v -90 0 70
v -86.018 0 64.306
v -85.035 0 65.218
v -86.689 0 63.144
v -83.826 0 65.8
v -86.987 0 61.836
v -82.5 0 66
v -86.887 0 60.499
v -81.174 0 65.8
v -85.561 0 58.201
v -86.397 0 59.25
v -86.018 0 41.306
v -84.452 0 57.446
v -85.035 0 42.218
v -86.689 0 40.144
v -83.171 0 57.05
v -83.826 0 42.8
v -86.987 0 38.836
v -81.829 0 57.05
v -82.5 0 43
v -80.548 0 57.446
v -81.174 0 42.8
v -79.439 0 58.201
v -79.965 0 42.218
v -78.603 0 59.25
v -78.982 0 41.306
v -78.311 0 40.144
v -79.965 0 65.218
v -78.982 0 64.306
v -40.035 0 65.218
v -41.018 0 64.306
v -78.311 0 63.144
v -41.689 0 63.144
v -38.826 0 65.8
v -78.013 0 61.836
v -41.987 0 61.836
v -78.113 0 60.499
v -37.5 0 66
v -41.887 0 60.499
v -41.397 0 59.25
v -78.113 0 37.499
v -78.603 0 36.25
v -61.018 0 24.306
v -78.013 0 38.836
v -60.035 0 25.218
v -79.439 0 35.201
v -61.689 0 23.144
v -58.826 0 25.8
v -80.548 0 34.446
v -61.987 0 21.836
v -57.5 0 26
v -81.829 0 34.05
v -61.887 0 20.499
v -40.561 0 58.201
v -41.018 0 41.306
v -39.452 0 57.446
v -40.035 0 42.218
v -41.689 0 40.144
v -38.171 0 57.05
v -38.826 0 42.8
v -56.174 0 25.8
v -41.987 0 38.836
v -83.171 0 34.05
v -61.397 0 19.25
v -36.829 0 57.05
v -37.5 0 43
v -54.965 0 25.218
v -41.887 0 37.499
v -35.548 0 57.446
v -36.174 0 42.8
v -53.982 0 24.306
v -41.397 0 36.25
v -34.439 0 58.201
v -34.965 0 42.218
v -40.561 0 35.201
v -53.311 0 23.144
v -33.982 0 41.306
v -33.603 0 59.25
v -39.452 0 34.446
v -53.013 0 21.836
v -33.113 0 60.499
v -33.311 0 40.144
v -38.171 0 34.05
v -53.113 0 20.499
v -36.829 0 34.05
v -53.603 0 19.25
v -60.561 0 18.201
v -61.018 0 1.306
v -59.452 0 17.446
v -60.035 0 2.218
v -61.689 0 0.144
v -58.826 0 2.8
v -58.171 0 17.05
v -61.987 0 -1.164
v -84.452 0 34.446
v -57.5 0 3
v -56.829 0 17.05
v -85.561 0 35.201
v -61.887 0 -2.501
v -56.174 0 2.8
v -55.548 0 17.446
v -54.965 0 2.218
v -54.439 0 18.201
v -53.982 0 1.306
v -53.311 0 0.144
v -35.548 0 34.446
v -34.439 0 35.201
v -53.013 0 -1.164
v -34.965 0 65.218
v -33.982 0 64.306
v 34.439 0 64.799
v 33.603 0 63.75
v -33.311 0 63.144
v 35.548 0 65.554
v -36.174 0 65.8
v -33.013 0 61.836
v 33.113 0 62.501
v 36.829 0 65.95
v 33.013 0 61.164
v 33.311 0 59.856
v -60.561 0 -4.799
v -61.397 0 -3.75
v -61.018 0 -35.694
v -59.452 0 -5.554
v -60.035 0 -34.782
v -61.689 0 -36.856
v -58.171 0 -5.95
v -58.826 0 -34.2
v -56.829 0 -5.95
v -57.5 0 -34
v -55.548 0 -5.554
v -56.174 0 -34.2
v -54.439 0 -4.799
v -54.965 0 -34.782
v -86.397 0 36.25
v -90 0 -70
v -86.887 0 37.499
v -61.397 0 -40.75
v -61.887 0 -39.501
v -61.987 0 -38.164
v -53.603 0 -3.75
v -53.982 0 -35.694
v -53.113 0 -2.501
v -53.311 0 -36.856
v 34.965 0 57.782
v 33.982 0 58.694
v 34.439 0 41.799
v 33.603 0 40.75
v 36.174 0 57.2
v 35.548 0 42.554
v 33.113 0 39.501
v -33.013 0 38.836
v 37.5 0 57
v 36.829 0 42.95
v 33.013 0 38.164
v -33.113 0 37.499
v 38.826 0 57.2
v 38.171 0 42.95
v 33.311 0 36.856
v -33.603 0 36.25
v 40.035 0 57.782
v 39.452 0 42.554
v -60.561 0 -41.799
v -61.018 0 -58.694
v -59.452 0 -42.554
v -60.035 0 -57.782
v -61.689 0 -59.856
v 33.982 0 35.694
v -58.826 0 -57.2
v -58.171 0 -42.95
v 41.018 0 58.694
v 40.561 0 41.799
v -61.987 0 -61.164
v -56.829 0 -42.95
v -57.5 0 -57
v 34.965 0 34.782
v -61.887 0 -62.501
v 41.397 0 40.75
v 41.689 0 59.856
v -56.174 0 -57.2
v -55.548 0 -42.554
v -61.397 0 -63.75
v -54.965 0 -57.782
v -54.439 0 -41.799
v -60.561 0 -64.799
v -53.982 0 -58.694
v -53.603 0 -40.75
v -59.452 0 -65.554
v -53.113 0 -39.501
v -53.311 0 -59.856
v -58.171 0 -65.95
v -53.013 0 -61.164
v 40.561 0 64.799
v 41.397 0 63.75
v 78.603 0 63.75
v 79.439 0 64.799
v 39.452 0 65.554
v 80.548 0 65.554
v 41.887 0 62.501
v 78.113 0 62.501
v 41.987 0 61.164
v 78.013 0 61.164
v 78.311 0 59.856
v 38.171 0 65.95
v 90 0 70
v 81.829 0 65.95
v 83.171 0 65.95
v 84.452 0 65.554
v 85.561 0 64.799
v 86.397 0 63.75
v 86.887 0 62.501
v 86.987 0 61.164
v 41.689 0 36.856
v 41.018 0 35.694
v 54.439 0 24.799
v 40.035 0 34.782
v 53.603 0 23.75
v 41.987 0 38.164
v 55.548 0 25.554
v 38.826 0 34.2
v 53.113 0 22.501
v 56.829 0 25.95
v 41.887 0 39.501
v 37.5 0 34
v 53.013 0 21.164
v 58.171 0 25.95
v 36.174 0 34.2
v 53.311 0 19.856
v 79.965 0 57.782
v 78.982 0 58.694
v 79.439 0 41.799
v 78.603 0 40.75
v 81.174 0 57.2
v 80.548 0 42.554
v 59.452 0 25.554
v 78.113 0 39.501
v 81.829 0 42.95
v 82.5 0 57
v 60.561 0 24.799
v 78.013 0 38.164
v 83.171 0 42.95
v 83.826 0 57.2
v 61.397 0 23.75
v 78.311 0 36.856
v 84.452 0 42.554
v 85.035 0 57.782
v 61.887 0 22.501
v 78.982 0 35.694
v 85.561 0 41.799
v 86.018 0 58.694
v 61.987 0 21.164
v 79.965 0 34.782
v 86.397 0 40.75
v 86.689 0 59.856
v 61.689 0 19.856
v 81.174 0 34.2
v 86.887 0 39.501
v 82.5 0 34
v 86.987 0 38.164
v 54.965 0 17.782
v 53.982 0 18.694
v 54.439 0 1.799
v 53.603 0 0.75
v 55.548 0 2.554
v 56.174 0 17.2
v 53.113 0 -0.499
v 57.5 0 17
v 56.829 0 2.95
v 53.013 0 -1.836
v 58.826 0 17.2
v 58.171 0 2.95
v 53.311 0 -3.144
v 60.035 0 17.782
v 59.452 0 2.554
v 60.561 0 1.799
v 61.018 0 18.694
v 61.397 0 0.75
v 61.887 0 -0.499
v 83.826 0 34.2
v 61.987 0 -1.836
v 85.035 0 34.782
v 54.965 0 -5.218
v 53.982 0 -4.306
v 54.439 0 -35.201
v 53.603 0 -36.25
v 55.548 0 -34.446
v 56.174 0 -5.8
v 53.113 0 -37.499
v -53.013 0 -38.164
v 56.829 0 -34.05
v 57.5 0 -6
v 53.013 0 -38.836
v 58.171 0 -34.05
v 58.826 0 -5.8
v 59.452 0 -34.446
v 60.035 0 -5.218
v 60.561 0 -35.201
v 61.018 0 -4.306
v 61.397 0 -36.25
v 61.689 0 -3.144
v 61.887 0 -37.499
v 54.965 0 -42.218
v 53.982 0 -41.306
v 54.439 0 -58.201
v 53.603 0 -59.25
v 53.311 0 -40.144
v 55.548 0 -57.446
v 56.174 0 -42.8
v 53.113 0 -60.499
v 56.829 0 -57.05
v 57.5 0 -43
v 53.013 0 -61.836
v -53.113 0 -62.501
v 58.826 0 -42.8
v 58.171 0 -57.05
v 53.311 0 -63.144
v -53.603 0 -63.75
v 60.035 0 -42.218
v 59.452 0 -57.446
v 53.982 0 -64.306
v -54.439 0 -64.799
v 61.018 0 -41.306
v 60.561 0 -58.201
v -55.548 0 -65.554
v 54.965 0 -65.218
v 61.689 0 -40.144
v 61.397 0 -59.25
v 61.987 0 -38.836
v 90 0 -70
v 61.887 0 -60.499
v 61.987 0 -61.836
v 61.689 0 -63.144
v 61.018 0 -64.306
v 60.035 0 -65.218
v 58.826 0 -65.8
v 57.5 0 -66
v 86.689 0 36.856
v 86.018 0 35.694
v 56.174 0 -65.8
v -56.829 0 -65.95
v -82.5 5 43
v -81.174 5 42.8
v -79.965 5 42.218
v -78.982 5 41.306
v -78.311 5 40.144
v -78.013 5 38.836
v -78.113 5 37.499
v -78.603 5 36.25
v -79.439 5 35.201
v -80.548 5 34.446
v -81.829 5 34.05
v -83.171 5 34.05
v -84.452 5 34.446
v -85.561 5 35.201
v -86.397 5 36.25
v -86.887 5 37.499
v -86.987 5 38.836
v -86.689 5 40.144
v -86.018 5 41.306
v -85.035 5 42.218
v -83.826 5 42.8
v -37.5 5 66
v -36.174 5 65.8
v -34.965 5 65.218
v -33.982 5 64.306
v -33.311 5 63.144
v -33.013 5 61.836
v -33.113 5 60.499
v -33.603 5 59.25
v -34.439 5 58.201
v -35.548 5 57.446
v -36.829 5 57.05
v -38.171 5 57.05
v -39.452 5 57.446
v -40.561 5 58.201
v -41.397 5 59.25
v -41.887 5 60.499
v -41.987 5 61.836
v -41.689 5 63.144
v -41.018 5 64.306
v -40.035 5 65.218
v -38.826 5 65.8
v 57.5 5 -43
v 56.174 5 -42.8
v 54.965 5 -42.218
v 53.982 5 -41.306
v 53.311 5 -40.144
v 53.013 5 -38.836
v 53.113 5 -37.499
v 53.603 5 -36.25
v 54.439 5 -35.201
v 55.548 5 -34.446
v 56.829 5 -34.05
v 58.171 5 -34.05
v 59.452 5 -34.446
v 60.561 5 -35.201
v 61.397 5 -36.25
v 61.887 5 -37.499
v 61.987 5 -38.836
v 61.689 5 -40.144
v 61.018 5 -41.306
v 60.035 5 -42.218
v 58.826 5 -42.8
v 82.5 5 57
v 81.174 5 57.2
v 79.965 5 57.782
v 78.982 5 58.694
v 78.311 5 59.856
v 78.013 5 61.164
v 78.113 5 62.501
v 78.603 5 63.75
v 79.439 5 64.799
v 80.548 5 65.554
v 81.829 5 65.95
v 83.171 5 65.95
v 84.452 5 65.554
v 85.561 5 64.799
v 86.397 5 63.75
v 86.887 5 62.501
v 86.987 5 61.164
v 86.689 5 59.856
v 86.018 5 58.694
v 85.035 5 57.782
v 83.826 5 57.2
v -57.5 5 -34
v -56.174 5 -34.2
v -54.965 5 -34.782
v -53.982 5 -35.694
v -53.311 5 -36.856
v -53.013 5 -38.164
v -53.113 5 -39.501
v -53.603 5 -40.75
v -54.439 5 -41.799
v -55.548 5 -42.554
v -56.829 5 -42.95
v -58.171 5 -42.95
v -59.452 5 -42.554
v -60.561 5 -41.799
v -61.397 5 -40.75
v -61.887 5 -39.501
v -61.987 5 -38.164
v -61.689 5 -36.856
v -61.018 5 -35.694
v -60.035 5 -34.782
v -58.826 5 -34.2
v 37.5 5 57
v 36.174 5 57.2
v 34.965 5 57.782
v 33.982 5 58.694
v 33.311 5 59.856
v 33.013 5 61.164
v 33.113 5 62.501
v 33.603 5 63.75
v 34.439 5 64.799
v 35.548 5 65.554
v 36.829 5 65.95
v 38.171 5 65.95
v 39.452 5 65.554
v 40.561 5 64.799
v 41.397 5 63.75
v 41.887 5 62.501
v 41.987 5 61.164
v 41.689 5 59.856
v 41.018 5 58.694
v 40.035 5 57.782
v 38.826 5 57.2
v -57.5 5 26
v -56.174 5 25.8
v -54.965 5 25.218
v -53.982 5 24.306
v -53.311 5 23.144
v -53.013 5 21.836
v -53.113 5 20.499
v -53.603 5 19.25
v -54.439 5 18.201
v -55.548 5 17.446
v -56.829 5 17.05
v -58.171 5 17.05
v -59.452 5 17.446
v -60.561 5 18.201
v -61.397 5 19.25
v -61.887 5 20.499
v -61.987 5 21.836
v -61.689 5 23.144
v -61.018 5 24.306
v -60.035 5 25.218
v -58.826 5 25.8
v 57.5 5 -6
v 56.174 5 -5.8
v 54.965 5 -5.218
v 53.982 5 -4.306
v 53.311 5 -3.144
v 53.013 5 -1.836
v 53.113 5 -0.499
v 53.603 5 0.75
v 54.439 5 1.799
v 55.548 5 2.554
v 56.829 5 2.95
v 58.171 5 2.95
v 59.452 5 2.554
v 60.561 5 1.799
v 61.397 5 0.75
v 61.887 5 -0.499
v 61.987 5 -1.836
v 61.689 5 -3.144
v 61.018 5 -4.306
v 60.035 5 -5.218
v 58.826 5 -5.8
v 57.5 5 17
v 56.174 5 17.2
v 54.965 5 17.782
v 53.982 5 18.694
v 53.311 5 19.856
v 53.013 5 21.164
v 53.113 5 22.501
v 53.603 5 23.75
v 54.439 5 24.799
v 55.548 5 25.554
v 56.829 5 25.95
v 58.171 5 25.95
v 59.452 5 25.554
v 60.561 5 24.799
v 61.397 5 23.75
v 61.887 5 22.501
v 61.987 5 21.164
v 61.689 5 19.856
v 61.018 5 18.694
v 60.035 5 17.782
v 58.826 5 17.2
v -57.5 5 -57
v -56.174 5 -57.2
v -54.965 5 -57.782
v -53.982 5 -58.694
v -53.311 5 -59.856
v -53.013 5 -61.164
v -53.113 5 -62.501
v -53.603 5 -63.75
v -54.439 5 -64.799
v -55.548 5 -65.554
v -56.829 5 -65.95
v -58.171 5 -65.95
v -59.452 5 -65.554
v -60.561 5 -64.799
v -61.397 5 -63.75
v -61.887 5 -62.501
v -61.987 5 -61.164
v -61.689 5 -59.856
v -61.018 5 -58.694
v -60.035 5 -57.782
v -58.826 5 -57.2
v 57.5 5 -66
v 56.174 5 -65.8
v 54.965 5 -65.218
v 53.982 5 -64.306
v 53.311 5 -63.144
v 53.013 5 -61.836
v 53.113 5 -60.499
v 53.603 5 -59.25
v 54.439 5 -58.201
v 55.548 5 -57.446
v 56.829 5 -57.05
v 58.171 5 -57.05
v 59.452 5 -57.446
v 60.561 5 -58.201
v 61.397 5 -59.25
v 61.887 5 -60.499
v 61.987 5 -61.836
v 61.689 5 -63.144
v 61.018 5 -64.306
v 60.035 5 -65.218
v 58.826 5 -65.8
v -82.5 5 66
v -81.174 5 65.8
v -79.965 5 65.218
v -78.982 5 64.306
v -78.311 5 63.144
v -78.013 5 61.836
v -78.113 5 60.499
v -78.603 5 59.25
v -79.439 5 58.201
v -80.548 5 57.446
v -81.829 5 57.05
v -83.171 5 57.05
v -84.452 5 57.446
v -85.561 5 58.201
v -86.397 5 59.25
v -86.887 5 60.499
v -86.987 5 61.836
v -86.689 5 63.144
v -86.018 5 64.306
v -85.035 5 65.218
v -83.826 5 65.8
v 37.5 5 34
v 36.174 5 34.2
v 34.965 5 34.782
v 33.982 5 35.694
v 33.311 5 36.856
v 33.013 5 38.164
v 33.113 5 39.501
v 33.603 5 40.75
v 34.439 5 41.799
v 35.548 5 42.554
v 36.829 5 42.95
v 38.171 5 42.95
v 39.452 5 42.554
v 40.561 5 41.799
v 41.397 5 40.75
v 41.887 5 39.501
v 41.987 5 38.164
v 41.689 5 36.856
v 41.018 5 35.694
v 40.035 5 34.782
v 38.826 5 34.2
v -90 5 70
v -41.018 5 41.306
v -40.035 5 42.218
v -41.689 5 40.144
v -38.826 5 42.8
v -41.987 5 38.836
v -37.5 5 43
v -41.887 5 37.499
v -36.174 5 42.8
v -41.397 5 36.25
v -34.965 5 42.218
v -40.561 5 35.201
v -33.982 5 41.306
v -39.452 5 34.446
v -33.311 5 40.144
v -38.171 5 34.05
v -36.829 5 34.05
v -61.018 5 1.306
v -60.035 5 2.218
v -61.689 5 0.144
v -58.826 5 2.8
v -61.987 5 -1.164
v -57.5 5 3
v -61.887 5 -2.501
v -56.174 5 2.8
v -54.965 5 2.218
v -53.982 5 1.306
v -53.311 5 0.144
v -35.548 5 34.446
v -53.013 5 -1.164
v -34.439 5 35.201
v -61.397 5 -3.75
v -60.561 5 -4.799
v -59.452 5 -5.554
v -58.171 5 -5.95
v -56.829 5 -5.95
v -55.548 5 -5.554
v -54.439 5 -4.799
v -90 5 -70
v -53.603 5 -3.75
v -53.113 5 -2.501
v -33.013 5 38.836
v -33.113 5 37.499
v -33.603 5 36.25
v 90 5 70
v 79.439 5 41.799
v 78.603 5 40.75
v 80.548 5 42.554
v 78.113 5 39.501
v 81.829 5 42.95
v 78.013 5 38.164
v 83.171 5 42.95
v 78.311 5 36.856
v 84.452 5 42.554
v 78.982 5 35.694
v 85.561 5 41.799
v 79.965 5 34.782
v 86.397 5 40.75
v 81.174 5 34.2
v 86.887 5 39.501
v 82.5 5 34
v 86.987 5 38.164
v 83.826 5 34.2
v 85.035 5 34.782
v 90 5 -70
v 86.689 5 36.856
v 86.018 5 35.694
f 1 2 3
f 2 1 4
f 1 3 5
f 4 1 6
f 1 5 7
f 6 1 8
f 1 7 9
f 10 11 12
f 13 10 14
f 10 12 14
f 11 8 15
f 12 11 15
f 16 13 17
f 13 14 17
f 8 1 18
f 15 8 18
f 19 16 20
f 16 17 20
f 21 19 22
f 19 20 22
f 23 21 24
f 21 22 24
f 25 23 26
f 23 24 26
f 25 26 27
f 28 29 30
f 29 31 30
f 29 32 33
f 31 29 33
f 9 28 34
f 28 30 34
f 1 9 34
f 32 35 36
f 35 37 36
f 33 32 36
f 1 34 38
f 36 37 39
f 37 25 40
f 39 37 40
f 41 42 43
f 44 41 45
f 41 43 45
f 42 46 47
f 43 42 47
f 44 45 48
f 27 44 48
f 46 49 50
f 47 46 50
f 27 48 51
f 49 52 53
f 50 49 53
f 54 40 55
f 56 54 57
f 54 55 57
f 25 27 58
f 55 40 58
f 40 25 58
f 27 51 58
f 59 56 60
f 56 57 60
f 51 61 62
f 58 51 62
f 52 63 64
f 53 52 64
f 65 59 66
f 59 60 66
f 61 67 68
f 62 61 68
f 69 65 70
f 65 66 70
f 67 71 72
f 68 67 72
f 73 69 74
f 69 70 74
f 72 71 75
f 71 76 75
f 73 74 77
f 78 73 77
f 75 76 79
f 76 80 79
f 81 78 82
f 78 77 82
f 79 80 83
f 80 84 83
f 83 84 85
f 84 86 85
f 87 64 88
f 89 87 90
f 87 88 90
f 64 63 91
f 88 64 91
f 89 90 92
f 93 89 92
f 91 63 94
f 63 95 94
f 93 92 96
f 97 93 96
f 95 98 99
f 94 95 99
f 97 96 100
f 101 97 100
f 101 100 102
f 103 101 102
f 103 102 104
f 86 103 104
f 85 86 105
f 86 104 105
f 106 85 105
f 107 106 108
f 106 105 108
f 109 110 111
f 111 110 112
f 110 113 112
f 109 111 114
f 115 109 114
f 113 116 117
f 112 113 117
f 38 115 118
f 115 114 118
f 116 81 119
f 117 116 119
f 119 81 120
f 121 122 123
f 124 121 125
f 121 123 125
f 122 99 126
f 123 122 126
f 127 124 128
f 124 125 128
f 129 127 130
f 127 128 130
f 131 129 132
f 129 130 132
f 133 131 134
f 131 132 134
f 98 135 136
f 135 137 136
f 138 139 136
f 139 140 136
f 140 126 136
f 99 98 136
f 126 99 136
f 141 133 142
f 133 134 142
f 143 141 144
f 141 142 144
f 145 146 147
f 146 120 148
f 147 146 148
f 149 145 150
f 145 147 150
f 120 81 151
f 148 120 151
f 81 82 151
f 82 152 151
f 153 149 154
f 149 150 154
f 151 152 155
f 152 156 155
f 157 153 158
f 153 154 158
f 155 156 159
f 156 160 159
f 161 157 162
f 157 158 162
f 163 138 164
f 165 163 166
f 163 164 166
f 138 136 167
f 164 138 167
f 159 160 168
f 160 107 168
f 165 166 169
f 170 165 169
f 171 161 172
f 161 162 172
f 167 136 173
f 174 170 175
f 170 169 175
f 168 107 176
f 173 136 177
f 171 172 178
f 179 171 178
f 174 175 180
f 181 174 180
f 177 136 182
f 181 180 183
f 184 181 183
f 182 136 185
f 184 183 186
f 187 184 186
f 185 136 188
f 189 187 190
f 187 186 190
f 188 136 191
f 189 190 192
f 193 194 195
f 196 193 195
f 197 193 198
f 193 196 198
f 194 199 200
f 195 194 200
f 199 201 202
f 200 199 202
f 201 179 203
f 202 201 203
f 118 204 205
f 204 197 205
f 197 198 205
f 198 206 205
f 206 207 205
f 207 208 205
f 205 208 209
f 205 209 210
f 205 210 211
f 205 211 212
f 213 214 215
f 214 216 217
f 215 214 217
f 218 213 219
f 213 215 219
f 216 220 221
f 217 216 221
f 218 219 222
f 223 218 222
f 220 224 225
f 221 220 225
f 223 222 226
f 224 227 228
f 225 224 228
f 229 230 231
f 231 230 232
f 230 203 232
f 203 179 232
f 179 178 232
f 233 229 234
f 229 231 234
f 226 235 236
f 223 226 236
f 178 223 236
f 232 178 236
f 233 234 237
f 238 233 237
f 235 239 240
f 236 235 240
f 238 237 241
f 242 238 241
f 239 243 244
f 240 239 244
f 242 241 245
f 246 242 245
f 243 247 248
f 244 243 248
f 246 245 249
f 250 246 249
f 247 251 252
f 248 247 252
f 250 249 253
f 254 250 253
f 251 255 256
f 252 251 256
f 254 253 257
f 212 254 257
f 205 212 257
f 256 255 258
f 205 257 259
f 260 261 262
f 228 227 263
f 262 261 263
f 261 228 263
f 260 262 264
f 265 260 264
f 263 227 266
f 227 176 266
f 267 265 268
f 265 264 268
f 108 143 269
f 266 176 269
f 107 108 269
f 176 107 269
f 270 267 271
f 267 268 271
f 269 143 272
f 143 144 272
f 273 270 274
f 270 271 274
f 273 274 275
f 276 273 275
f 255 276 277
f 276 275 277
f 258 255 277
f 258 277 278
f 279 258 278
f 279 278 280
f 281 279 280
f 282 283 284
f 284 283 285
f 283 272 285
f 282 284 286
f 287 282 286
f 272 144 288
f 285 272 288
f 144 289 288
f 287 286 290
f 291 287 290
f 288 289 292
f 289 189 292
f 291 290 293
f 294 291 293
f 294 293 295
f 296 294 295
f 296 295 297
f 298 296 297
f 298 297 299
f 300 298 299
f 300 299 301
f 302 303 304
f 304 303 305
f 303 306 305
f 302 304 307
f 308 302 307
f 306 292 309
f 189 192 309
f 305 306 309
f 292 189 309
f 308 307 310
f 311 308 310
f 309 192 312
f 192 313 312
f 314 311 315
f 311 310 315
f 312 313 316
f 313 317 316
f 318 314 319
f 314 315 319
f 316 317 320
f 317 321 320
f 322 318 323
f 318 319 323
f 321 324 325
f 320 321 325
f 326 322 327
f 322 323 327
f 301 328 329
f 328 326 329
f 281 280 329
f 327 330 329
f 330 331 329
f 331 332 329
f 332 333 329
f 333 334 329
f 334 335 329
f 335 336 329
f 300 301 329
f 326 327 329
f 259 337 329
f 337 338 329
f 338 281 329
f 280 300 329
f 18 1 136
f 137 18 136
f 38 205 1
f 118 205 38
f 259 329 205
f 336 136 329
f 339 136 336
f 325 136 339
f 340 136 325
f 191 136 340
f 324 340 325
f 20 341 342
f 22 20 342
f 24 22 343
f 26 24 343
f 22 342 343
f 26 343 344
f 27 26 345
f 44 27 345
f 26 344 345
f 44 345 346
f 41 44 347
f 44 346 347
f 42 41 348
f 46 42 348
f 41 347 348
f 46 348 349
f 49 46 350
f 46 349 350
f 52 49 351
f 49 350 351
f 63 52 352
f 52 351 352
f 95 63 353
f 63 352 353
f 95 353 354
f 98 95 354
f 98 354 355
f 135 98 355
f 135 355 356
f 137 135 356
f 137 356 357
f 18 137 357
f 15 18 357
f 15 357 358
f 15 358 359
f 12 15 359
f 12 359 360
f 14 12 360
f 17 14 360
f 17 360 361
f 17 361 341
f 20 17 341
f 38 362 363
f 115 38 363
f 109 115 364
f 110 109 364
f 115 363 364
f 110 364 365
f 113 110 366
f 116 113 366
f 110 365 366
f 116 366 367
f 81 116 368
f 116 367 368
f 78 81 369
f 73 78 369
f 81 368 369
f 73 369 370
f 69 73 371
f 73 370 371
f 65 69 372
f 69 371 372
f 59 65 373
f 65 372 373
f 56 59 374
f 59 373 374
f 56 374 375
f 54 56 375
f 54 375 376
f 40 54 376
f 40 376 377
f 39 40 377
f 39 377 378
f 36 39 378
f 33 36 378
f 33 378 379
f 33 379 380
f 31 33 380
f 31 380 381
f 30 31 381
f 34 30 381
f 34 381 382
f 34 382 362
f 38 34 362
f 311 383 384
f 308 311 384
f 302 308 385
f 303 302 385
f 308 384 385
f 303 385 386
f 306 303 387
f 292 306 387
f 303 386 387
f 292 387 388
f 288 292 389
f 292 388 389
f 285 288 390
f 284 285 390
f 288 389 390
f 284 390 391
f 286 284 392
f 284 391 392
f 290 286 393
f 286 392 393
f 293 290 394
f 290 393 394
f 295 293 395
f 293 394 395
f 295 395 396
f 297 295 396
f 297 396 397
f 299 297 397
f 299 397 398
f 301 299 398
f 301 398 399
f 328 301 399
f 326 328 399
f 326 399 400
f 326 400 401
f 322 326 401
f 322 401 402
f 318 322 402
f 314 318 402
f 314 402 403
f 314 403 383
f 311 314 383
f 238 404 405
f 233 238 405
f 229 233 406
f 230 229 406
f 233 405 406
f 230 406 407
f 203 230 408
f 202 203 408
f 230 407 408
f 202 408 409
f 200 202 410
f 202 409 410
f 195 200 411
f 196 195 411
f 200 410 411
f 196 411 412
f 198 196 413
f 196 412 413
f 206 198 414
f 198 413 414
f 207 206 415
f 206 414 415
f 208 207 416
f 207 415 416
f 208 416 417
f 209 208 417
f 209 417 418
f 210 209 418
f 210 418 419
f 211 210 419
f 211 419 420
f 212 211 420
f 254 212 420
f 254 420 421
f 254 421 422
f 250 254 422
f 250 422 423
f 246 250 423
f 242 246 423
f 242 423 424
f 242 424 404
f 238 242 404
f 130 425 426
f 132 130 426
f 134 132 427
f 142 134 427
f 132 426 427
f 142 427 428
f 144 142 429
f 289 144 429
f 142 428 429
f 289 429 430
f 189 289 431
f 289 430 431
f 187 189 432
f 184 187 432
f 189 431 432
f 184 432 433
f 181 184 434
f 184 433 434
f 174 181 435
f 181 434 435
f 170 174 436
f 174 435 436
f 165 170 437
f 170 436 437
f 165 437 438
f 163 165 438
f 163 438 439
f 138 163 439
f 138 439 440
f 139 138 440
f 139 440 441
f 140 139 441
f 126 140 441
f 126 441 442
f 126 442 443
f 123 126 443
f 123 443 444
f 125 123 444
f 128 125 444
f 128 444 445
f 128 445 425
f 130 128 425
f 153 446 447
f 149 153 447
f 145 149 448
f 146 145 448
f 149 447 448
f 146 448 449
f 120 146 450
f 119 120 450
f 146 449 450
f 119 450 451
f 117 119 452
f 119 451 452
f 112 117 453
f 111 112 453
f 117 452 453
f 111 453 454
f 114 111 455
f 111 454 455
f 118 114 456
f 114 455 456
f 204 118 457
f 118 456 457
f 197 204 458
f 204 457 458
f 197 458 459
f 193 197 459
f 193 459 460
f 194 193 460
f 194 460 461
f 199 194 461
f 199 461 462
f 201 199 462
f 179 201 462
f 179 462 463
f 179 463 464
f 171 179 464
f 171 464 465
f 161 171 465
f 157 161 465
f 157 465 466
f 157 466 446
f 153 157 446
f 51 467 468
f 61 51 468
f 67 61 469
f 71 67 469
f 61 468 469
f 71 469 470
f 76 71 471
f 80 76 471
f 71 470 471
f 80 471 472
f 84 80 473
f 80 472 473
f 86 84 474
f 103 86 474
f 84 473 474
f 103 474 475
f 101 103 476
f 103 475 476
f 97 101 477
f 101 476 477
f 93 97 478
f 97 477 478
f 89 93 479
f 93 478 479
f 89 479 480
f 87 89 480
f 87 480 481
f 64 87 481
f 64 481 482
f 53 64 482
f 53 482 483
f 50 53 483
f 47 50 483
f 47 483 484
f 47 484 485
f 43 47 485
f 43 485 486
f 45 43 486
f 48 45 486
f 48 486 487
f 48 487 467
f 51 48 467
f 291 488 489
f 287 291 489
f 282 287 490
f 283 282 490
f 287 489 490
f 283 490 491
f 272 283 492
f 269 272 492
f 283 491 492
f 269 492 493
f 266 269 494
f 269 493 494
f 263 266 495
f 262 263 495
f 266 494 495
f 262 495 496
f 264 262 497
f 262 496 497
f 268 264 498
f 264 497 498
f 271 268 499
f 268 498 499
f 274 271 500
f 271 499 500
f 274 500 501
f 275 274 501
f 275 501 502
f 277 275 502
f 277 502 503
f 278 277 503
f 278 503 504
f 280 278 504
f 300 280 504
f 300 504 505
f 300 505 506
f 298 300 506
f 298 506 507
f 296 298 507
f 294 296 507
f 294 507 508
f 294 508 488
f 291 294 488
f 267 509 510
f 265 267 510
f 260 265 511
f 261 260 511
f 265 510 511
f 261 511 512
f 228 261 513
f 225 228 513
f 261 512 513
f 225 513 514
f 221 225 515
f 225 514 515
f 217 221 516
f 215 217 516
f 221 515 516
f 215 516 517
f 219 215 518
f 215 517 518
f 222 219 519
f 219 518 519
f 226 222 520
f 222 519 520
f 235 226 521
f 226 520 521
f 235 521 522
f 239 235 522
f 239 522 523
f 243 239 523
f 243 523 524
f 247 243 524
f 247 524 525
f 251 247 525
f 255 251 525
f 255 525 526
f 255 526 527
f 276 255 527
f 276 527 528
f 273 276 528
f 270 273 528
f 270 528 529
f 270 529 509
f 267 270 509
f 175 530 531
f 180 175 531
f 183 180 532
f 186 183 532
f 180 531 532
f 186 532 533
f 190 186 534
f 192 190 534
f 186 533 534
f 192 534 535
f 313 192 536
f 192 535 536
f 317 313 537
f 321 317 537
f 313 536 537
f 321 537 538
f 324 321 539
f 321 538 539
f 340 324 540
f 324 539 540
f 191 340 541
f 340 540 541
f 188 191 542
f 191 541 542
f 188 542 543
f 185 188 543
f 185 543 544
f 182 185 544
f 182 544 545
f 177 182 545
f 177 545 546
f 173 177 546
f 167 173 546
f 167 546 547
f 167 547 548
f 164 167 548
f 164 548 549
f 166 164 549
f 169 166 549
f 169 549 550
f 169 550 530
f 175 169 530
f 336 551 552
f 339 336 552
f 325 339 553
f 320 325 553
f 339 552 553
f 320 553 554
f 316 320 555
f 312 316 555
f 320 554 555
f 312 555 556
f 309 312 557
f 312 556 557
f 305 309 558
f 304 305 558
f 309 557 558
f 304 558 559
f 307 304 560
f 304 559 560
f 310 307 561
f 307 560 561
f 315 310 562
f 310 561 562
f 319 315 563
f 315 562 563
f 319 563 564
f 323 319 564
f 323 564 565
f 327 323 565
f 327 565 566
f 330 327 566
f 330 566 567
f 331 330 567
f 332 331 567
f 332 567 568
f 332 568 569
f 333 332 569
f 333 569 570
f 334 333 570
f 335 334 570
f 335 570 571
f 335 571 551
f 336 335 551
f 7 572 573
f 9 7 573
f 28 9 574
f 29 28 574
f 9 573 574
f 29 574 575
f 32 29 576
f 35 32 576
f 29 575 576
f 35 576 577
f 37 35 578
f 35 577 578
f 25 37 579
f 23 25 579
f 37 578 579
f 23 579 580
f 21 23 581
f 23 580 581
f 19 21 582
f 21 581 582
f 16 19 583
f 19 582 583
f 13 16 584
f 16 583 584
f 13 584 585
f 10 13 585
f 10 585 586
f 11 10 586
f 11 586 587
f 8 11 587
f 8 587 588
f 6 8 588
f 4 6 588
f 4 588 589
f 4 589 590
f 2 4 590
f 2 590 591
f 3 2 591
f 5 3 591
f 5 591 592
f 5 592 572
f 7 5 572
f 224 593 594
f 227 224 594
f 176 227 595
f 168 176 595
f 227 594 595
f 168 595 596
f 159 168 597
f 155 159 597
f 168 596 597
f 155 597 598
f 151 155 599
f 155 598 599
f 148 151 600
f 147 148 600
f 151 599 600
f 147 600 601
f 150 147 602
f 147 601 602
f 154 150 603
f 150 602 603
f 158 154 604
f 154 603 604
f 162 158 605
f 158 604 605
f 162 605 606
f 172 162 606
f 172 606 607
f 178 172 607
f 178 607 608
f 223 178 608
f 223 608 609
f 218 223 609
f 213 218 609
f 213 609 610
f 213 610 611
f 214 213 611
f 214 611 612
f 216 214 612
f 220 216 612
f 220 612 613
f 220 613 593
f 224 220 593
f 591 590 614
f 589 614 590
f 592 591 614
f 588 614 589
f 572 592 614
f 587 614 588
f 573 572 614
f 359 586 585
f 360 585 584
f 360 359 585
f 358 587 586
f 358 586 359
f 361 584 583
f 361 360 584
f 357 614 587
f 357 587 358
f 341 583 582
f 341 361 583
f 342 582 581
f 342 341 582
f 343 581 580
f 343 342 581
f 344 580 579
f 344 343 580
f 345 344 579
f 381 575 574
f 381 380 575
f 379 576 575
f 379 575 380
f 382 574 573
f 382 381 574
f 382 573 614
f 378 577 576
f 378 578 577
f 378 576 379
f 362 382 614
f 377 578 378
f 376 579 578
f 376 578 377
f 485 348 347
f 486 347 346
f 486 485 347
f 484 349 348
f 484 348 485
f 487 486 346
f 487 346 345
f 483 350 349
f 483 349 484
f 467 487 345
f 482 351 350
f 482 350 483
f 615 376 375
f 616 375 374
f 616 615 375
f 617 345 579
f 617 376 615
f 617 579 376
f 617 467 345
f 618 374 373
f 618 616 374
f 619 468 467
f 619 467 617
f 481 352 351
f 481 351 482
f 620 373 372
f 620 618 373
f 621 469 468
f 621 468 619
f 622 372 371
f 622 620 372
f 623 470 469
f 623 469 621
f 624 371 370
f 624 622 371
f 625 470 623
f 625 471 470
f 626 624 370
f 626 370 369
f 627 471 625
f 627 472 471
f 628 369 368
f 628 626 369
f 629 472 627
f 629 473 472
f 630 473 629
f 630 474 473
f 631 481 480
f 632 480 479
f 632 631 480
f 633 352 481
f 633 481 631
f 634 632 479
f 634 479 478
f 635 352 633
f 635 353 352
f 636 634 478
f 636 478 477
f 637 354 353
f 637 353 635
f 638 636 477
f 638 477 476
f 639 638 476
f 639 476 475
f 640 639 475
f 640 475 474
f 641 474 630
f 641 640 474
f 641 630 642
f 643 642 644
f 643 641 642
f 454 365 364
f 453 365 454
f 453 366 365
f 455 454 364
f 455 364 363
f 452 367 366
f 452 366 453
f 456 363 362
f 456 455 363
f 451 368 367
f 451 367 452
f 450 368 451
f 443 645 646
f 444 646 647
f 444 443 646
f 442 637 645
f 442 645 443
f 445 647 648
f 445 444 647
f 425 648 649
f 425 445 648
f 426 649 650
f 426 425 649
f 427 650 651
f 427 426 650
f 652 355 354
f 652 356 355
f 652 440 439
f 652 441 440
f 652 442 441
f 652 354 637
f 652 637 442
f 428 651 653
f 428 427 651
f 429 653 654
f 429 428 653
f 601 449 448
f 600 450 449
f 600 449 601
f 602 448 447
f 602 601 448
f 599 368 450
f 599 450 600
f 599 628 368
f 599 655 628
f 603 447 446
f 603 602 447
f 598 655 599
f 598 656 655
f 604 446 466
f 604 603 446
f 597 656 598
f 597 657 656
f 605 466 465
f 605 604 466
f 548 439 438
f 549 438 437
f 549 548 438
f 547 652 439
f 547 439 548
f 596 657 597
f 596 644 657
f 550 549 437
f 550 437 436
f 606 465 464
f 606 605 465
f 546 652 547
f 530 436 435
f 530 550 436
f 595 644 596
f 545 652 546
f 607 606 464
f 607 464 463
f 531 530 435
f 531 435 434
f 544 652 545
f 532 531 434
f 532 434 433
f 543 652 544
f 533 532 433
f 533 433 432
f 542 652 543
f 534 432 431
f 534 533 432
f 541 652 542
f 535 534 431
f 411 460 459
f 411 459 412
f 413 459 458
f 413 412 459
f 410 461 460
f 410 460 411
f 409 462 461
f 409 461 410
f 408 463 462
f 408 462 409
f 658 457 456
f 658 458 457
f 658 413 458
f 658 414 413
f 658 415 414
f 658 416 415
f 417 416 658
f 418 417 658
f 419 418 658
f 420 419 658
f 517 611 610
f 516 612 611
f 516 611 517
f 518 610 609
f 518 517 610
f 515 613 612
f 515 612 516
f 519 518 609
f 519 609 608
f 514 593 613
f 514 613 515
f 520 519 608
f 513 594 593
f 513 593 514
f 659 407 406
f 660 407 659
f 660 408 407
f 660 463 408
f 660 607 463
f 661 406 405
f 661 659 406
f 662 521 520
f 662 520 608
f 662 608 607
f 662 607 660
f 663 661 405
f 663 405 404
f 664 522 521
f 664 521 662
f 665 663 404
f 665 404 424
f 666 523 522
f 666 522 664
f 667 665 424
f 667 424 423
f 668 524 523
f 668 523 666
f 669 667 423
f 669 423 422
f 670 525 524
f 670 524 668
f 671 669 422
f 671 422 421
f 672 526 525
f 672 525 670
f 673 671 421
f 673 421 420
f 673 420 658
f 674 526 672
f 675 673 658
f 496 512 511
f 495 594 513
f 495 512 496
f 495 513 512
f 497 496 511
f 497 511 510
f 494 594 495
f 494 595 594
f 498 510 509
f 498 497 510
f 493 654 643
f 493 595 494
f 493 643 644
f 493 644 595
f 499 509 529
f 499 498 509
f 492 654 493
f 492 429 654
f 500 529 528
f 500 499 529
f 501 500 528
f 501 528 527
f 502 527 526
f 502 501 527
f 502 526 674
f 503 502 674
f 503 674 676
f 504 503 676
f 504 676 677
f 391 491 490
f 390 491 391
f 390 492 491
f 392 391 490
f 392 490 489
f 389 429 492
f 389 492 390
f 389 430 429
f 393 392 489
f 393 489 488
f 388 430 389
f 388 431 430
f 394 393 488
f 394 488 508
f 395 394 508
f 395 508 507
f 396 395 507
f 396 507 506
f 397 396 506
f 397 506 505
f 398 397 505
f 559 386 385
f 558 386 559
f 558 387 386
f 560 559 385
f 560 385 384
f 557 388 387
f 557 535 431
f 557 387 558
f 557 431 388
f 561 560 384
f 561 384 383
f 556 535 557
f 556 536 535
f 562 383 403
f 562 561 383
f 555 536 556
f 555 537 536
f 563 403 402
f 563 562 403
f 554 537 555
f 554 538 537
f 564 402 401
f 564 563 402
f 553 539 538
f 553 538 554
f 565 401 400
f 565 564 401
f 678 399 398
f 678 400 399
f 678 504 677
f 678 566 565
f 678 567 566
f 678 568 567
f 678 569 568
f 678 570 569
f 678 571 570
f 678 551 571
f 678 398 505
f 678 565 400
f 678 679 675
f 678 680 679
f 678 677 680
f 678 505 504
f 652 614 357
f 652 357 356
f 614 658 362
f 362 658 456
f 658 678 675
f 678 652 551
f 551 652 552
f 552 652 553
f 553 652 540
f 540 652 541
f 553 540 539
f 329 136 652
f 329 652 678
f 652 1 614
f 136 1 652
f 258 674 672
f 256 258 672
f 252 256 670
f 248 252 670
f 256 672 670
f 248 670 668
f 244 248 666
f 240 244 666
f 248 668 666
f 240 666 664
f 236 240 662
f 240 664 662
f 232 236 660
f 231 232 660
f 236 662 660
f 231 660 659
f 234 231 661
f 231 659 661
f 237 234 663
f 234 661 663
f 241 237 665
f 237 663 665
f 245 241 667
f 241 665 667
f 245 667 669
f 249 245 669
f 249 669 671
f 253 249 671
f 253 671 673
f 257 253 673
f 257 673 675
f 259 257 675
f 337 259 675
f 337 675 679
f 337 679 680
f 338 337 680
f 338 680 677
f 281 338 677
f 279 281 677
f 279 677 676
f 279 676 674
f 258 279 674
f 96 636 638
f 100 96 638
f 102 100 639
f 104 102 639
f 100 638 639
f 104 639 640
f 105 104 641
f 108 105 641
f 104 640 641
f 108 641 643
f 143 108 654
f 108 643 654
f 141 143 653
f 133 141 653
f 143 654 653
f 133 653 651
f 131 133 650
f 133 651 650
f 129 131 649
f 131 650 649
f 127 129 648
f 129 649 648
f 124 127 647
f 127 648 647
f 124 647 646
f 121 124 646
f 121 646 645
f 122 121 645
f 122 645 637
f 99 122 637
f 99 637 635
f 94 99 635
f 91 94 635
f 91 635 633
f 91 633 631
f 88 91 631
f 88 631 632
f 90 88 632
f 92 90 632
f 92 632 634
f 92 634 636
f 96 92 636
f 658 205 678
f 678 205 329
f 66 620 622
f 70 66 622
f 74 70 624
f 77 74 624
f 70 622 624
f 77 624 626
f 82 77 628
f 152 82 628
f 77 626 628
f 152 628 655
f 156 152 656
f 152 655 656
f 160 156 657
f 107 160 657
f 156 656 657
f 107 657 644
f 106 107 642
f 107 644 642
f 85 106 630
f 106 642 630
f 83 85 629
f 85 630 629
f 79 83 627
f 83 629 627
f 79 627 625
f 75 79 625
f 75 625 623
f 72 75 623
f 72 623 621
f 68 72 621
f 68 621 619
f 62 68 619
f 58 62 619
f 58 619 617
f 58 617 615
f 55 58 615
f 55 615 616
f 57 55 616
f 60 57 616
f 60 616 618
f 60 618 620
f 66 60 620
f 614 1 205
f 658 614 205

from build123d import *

# Parameters (mm, degrees)
SKETCH1_W   = 180
SKETCH1_H   = 140
BODY_DEPTH  = 5
SKETCH2_R   = 4.5
HOLES_DEPTH = 115.127122105


with BuildPart() as part:
    # Sketch1 → Body (new body)
    with BuildSketch(Plane(origin=(0, 0, 0), x_dir=(1, 0, 0), z_dir=(0, 1, 0))):
        Rectangle(SKETCH1_W, SKETCH1_H)
    extrude(amount=BODY_DEPTH)

    # Sketch2 → Holes (cut, through all)
    with BuildSketch(Plane(origin=(0, 5, 0), x_dir=(1, 0, 0), z_dir=(0, 1, 0))):
        with Locations(Location((-57.5, 61.5, 0), (0, 0, 270))):
            Circle(SKETCH2_R)
        with Locations(Location((-57.5, 38.5, 0), (0, 0, 270))):
            Circle(SKETCH2_R)
        with Locations(Location((-57.5, 1.5, 0), (0, 0, 270))):
            Circle(SKETCH2_R)
        with Locations(Location((-57.5, -21.5, 0), (0, 0, 270))):
            Circle(SKETCH2_R)
        with Locations(Location((-82.5, -38.5, 0), (0, 0, 270))):
            Circle(SKETCH2_R)
        with Locations(Location((-82.5, -61.5, 0), (0, 0, 270))):
            Circle(SKETCH2_R)
        with Locations(Location((-37.5, -61.5, 0), (0, 0, 270))):
            Circle(SKETCH2_R)
        with Locations(Location((-37.5, -38.5, 0), (0, 0, 270))):
            Circle(SKETCH2_R)
        with Locations(Location((37.5, -38.5, 0), (0, 0, 90))):
            Circle(SKETCH2_R)
        with Locations(Location((37.5, -61.5, 0), (0, 0, 90))):
            Circle(SKETCH2_R)
        with Locations(Location((82.5, -61.5, 0), (0, 0, 90))):
            Circle(SKETCH2_R)
        with Locations(Location((82.5, -38.5, 0), (0, 0, 90))):
            Circle(SKETCH2_R)
        with Locations(Location((57.5, -21.5, 0), (0, 0, 90))):
            Circle(SKETCH2_R)
        with Locations(Location((57.5, 1.5, 0), (0, 0, 90))):
            Circle(SKETCH2_R)
        with Locations(Location((57.5, 38.5, 0), (0, 0, 90))):
            Circle(SKETCH2_R)
        with Locations(Location((57.5, 61.5, 0), (0, 0, 90))):
            Circle(SKETCH2_R)
    extrude(amount=-HOLES_DEPTH, mode=Mode.SUBTRACT)


solid = part.part
